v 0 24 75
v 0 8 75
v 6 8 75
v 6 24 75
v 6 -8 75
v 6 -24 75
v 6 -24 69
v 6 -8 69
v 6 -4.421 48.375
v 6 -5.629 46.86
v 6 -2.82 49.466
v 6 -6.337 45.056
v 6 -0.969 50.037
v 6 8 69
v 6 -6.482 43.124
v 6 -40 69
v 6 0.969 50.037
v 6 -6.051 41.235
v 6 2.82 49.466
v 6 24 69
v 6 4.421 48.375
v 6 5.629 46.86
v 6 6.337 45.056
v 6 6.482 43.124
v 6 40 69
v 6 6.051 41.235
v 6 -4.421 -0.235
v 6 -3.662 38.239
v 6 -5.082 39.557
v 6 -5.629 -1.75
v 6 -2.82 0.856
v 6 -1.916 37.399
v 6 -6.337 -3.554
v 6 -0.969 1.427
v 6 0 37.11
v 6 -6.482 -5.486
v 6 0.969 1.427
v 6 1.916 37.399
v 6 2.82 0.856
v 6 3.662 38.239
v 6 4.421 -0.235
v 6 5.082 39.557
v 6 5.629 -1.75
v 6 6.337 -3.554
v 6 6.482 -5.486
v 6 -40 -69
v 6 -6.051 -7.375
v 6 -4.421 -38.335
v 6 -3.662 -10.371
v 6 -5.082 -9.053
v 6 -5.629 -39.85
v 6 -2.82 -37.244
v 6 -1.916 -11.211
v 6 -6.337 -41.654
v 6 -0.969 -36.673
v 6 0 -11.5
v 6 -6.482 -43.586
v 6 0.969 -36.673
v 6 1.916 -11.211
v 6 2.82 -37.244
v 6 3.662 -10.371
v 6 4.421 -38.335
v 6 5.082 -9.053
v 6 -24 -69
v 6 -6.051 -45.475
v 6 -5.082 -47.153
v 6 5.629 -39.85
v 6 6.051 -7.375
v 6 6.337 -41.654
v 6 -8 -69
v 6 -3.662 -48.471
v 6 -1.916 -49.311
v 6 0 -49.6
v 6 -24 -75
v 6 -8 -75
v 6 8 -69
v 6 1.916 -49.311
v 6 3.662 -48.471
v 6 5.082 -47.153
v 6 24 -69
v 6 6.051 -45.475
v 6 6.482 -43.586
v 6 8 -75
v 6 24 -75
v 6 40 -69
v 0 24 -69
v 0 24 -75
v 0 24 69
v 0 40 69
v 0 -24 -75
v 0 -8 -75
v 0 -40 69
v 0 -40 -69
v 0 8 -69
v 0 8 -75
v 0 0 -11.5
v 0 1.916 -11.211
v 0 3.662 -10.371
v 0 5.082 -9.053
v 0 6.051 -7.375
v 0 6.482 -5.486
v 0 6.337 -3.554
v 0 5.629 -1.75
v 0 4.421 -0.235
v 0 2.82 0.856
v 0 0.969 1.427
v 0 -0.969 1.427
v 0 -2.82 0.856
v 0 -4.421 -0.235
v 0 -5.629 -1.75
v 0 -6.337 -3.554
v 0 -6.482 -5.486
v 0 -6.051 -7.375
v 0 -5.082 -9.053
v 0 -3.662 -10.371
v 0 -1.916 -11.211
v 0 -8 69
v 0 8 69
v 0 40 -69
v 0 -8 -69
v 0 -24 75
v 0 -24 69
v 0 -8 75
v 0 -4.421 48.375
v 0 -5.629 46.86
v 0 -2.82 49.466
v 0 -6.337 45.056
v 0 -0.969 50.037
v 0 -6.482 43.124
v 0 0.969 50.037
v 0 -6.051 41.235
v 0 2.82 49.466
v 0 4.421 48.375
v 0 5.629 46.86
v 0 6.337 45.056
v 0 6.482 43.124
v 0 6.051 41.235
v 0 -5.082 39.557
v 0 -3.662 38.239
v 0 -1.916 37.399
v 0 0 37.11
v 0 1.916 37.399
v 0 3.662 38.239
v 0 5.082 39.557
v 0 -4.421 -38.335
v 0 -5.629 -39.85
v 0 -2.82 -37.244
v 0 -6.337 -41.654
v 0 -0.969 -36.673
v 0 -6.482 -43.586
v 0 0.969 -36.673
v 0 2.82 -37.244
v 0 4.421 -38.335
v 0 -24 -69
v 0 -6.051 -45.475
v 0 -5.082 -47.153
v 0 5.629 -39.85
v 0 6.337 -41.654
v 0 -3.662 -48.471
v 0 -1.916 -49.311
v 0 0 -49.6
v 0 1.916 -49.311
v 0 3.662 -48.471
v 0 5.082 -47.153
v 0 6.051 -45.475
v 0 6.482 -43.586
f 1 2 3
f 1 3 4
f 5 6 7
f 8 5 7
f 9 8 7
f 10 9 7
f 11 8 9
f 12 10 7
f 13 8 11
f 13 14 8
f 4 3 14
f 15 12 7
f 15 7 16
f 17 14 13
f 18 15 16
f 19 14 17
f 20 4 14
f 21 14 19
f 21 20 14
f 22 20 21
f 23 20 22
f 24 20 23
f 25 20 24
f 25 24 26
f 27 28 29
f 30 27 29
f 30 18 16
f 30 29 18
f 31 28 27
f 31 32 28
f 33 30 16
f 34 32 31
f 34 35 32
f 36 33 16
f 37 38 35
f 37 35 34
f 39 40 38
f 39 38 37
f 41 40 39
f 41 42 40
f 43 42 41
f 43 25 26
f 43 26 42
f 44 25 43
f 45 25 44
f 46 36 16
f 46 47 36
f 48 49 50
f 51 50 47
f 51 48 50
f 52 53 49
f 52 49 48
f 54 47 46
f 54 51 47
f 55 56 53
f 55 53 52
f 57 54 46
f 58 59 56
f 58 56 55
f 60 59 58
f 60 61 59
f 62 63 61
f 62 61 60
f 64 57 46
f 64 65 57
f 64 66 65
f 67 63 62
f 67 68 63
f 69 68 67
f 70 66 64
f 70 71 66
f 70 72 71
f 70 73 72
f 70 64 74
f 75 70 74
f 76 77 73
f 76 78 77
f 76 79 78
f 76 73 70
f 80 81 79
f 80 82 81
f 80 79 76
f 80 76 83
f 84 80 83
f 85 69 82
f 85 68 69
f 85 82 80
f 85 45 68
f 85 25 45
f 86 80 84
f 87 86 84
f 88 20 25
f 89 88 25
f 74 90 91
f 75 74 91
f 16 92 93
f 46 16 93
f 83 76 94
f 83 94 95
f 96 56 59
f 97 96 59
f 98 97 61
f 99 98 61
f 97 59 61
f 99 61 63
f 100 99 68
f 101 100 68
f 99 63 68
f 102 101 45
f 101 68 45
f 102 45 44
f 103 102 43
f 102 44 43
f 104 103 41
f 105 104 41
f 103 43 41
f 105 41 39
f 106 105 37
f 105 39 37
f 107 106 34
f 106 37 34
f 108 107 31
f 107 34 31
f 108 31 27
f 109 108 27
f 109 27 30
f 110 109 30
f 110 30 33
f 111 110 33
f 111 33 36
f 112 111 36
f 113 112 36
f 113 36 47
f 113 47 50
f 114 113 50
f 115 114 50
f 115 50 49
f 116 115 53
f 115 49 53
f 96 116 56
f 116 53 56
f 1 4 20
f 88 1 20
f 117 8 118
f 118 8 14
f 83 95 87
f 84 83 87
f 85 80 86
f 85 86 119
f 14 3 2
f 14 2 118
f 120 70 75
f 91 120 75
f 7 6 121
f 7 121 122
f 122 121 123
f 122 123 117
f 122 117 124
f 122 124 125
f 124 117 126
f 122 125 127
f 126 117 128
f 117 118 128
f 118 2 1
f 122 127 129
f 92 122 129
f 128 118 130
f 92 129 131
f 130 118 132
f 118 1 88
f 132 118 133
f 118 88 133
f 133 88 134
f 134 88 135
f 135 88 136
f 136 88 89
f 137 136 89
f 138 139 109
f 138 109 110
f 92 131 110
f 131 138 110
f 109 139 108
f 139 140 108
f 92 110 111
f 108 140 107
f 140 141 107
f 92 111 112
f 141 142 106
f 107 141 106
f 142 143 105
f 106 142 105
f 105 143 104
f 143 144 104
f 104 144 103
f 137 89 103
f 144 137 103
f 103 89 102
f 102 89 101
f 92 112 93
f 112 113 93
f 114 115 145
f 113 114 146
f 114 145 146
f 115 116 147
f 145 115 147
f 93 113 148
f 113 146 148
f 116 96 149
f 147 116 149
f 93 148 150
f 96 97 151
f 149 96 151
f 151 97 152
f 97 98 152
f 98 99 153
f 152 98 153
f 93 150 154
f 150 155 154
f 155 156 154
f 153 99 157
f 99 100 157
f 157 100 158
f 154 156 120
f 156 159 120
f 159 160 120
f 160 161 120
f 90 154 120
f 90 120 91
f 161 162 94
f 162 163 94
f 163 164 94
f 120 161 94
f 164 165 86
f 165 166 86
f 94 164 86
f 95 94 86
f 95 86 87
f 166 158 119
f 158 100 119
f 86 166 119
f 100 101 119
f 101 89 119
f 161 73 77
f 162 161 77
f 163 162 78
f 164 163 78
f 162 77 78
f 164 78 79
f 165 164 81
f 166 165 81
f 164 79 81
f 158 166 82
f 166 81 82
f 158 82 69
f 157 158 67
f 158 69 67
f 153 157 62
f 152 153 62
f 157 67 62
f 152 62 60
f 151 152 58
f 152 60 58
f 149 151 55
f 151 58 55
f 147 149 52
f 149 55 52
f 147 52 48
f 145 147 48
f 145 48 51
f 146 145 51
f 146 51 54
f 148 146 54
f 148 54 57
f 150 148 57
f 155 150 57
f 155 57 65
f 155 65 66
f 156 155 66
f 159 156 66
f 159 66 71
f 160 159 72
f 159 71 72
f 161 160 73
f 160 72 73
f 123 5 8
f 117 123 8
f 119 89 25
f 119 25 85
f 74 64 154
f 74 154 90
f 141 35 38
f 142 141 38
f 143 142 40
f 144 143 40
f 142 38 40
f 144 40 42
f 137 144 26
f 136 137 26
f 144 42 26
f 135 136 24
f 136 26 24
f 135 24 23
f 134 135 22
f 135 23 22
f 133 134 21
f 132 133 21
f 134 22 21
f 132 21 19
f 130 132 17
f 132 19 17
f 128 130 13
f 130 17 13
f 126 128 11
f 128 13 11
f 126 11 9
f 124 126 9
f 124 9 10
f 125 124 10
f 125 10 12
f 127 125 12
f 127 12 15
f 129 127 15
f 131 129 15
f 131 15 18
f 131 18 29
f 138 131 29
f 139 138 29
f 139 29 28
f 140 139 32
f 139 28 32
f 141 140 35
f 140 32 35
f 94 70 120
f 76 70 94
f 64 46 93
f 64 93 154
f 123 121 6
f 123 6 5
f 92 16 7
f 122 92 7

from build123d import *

# Parameters (mm, degrees)
CROQUIS1_W              = 150
CROQUIS1_H              = 80
SALIENTE_EXTRUIR1_DEPTH = 6
CROQUIS2_R              = 6.5
CORTAR_EXTRUIR1_DEPTH   = 6
CROQUIS3_W              = 6
CROQUIS3_H              = 16
CORTAR_EXTRUIR2_DEPTH   = 6


with BuildPart() as part:
    # Croquis1 → Saliente-Extruir1 (new body)
    with BuildSketch(Plane(origin=(0, 0, 0), x_dir=(0, 0, -1), z_dir=(1, 0, 0))):
        Rectangle(CROQUIS1_W, CROQUIS1_H)
    extrude(amount=SALIENTE_EXTRUIR1_DEPTH)

    # Croquis2 → Cortar-Extruir1 (cut)
    with BuildSketch(Plane(origin=(6, 0, 0), x_dir=(0, 0, -1), z_dir=(1, 0, 0))):
        with Locations((-43.61, 0)):
            Circle(CROQUIS2_R)
        with Locations((5, 0)):
            Circle(CROQUIS2_R)
        with Locations((43.1, 0)):
            Circle(CROQUIS2_R)
    extrude(amount=-CORTAR_EXTRUIR1_DEPTH, mode=Mode.SUBTRACT)

    # Croquis3 → Cortar-Extruir2 (cut)
    with BuildSketch(Plane(origin=(6, 0, 0), x_dir=(0, 0, -1), z_dir=(1, 0, 0))):
        with Locations((-72, 32)):
            Rectangle(CROQUIS3_W, CROQUIS3_H)
        with Locations((-72, -32)):
            Rectangle(CROQUIS3_W, CROQUIS3_H)
        with Locations((72, -32)):
            Rectangle(CROQUIS3_W, CROQUIS3_H)
        with Locations((72, 32)):
            Rectangle(CROQUIS3_W, CROQUIS3_H)
        with Locations((72, 0)):
            Rectangle(CROQUIS3_W, CROQUIS3_H)
        with Locations((-72, 0)):
            Rectangle(CROQUIS3_W, CROQUIS3_H)
    extrude(amount=-CORTAR_EXTRUIR2_DEPTH, mode=Mode.SUBTRACT)


solid = part.part
